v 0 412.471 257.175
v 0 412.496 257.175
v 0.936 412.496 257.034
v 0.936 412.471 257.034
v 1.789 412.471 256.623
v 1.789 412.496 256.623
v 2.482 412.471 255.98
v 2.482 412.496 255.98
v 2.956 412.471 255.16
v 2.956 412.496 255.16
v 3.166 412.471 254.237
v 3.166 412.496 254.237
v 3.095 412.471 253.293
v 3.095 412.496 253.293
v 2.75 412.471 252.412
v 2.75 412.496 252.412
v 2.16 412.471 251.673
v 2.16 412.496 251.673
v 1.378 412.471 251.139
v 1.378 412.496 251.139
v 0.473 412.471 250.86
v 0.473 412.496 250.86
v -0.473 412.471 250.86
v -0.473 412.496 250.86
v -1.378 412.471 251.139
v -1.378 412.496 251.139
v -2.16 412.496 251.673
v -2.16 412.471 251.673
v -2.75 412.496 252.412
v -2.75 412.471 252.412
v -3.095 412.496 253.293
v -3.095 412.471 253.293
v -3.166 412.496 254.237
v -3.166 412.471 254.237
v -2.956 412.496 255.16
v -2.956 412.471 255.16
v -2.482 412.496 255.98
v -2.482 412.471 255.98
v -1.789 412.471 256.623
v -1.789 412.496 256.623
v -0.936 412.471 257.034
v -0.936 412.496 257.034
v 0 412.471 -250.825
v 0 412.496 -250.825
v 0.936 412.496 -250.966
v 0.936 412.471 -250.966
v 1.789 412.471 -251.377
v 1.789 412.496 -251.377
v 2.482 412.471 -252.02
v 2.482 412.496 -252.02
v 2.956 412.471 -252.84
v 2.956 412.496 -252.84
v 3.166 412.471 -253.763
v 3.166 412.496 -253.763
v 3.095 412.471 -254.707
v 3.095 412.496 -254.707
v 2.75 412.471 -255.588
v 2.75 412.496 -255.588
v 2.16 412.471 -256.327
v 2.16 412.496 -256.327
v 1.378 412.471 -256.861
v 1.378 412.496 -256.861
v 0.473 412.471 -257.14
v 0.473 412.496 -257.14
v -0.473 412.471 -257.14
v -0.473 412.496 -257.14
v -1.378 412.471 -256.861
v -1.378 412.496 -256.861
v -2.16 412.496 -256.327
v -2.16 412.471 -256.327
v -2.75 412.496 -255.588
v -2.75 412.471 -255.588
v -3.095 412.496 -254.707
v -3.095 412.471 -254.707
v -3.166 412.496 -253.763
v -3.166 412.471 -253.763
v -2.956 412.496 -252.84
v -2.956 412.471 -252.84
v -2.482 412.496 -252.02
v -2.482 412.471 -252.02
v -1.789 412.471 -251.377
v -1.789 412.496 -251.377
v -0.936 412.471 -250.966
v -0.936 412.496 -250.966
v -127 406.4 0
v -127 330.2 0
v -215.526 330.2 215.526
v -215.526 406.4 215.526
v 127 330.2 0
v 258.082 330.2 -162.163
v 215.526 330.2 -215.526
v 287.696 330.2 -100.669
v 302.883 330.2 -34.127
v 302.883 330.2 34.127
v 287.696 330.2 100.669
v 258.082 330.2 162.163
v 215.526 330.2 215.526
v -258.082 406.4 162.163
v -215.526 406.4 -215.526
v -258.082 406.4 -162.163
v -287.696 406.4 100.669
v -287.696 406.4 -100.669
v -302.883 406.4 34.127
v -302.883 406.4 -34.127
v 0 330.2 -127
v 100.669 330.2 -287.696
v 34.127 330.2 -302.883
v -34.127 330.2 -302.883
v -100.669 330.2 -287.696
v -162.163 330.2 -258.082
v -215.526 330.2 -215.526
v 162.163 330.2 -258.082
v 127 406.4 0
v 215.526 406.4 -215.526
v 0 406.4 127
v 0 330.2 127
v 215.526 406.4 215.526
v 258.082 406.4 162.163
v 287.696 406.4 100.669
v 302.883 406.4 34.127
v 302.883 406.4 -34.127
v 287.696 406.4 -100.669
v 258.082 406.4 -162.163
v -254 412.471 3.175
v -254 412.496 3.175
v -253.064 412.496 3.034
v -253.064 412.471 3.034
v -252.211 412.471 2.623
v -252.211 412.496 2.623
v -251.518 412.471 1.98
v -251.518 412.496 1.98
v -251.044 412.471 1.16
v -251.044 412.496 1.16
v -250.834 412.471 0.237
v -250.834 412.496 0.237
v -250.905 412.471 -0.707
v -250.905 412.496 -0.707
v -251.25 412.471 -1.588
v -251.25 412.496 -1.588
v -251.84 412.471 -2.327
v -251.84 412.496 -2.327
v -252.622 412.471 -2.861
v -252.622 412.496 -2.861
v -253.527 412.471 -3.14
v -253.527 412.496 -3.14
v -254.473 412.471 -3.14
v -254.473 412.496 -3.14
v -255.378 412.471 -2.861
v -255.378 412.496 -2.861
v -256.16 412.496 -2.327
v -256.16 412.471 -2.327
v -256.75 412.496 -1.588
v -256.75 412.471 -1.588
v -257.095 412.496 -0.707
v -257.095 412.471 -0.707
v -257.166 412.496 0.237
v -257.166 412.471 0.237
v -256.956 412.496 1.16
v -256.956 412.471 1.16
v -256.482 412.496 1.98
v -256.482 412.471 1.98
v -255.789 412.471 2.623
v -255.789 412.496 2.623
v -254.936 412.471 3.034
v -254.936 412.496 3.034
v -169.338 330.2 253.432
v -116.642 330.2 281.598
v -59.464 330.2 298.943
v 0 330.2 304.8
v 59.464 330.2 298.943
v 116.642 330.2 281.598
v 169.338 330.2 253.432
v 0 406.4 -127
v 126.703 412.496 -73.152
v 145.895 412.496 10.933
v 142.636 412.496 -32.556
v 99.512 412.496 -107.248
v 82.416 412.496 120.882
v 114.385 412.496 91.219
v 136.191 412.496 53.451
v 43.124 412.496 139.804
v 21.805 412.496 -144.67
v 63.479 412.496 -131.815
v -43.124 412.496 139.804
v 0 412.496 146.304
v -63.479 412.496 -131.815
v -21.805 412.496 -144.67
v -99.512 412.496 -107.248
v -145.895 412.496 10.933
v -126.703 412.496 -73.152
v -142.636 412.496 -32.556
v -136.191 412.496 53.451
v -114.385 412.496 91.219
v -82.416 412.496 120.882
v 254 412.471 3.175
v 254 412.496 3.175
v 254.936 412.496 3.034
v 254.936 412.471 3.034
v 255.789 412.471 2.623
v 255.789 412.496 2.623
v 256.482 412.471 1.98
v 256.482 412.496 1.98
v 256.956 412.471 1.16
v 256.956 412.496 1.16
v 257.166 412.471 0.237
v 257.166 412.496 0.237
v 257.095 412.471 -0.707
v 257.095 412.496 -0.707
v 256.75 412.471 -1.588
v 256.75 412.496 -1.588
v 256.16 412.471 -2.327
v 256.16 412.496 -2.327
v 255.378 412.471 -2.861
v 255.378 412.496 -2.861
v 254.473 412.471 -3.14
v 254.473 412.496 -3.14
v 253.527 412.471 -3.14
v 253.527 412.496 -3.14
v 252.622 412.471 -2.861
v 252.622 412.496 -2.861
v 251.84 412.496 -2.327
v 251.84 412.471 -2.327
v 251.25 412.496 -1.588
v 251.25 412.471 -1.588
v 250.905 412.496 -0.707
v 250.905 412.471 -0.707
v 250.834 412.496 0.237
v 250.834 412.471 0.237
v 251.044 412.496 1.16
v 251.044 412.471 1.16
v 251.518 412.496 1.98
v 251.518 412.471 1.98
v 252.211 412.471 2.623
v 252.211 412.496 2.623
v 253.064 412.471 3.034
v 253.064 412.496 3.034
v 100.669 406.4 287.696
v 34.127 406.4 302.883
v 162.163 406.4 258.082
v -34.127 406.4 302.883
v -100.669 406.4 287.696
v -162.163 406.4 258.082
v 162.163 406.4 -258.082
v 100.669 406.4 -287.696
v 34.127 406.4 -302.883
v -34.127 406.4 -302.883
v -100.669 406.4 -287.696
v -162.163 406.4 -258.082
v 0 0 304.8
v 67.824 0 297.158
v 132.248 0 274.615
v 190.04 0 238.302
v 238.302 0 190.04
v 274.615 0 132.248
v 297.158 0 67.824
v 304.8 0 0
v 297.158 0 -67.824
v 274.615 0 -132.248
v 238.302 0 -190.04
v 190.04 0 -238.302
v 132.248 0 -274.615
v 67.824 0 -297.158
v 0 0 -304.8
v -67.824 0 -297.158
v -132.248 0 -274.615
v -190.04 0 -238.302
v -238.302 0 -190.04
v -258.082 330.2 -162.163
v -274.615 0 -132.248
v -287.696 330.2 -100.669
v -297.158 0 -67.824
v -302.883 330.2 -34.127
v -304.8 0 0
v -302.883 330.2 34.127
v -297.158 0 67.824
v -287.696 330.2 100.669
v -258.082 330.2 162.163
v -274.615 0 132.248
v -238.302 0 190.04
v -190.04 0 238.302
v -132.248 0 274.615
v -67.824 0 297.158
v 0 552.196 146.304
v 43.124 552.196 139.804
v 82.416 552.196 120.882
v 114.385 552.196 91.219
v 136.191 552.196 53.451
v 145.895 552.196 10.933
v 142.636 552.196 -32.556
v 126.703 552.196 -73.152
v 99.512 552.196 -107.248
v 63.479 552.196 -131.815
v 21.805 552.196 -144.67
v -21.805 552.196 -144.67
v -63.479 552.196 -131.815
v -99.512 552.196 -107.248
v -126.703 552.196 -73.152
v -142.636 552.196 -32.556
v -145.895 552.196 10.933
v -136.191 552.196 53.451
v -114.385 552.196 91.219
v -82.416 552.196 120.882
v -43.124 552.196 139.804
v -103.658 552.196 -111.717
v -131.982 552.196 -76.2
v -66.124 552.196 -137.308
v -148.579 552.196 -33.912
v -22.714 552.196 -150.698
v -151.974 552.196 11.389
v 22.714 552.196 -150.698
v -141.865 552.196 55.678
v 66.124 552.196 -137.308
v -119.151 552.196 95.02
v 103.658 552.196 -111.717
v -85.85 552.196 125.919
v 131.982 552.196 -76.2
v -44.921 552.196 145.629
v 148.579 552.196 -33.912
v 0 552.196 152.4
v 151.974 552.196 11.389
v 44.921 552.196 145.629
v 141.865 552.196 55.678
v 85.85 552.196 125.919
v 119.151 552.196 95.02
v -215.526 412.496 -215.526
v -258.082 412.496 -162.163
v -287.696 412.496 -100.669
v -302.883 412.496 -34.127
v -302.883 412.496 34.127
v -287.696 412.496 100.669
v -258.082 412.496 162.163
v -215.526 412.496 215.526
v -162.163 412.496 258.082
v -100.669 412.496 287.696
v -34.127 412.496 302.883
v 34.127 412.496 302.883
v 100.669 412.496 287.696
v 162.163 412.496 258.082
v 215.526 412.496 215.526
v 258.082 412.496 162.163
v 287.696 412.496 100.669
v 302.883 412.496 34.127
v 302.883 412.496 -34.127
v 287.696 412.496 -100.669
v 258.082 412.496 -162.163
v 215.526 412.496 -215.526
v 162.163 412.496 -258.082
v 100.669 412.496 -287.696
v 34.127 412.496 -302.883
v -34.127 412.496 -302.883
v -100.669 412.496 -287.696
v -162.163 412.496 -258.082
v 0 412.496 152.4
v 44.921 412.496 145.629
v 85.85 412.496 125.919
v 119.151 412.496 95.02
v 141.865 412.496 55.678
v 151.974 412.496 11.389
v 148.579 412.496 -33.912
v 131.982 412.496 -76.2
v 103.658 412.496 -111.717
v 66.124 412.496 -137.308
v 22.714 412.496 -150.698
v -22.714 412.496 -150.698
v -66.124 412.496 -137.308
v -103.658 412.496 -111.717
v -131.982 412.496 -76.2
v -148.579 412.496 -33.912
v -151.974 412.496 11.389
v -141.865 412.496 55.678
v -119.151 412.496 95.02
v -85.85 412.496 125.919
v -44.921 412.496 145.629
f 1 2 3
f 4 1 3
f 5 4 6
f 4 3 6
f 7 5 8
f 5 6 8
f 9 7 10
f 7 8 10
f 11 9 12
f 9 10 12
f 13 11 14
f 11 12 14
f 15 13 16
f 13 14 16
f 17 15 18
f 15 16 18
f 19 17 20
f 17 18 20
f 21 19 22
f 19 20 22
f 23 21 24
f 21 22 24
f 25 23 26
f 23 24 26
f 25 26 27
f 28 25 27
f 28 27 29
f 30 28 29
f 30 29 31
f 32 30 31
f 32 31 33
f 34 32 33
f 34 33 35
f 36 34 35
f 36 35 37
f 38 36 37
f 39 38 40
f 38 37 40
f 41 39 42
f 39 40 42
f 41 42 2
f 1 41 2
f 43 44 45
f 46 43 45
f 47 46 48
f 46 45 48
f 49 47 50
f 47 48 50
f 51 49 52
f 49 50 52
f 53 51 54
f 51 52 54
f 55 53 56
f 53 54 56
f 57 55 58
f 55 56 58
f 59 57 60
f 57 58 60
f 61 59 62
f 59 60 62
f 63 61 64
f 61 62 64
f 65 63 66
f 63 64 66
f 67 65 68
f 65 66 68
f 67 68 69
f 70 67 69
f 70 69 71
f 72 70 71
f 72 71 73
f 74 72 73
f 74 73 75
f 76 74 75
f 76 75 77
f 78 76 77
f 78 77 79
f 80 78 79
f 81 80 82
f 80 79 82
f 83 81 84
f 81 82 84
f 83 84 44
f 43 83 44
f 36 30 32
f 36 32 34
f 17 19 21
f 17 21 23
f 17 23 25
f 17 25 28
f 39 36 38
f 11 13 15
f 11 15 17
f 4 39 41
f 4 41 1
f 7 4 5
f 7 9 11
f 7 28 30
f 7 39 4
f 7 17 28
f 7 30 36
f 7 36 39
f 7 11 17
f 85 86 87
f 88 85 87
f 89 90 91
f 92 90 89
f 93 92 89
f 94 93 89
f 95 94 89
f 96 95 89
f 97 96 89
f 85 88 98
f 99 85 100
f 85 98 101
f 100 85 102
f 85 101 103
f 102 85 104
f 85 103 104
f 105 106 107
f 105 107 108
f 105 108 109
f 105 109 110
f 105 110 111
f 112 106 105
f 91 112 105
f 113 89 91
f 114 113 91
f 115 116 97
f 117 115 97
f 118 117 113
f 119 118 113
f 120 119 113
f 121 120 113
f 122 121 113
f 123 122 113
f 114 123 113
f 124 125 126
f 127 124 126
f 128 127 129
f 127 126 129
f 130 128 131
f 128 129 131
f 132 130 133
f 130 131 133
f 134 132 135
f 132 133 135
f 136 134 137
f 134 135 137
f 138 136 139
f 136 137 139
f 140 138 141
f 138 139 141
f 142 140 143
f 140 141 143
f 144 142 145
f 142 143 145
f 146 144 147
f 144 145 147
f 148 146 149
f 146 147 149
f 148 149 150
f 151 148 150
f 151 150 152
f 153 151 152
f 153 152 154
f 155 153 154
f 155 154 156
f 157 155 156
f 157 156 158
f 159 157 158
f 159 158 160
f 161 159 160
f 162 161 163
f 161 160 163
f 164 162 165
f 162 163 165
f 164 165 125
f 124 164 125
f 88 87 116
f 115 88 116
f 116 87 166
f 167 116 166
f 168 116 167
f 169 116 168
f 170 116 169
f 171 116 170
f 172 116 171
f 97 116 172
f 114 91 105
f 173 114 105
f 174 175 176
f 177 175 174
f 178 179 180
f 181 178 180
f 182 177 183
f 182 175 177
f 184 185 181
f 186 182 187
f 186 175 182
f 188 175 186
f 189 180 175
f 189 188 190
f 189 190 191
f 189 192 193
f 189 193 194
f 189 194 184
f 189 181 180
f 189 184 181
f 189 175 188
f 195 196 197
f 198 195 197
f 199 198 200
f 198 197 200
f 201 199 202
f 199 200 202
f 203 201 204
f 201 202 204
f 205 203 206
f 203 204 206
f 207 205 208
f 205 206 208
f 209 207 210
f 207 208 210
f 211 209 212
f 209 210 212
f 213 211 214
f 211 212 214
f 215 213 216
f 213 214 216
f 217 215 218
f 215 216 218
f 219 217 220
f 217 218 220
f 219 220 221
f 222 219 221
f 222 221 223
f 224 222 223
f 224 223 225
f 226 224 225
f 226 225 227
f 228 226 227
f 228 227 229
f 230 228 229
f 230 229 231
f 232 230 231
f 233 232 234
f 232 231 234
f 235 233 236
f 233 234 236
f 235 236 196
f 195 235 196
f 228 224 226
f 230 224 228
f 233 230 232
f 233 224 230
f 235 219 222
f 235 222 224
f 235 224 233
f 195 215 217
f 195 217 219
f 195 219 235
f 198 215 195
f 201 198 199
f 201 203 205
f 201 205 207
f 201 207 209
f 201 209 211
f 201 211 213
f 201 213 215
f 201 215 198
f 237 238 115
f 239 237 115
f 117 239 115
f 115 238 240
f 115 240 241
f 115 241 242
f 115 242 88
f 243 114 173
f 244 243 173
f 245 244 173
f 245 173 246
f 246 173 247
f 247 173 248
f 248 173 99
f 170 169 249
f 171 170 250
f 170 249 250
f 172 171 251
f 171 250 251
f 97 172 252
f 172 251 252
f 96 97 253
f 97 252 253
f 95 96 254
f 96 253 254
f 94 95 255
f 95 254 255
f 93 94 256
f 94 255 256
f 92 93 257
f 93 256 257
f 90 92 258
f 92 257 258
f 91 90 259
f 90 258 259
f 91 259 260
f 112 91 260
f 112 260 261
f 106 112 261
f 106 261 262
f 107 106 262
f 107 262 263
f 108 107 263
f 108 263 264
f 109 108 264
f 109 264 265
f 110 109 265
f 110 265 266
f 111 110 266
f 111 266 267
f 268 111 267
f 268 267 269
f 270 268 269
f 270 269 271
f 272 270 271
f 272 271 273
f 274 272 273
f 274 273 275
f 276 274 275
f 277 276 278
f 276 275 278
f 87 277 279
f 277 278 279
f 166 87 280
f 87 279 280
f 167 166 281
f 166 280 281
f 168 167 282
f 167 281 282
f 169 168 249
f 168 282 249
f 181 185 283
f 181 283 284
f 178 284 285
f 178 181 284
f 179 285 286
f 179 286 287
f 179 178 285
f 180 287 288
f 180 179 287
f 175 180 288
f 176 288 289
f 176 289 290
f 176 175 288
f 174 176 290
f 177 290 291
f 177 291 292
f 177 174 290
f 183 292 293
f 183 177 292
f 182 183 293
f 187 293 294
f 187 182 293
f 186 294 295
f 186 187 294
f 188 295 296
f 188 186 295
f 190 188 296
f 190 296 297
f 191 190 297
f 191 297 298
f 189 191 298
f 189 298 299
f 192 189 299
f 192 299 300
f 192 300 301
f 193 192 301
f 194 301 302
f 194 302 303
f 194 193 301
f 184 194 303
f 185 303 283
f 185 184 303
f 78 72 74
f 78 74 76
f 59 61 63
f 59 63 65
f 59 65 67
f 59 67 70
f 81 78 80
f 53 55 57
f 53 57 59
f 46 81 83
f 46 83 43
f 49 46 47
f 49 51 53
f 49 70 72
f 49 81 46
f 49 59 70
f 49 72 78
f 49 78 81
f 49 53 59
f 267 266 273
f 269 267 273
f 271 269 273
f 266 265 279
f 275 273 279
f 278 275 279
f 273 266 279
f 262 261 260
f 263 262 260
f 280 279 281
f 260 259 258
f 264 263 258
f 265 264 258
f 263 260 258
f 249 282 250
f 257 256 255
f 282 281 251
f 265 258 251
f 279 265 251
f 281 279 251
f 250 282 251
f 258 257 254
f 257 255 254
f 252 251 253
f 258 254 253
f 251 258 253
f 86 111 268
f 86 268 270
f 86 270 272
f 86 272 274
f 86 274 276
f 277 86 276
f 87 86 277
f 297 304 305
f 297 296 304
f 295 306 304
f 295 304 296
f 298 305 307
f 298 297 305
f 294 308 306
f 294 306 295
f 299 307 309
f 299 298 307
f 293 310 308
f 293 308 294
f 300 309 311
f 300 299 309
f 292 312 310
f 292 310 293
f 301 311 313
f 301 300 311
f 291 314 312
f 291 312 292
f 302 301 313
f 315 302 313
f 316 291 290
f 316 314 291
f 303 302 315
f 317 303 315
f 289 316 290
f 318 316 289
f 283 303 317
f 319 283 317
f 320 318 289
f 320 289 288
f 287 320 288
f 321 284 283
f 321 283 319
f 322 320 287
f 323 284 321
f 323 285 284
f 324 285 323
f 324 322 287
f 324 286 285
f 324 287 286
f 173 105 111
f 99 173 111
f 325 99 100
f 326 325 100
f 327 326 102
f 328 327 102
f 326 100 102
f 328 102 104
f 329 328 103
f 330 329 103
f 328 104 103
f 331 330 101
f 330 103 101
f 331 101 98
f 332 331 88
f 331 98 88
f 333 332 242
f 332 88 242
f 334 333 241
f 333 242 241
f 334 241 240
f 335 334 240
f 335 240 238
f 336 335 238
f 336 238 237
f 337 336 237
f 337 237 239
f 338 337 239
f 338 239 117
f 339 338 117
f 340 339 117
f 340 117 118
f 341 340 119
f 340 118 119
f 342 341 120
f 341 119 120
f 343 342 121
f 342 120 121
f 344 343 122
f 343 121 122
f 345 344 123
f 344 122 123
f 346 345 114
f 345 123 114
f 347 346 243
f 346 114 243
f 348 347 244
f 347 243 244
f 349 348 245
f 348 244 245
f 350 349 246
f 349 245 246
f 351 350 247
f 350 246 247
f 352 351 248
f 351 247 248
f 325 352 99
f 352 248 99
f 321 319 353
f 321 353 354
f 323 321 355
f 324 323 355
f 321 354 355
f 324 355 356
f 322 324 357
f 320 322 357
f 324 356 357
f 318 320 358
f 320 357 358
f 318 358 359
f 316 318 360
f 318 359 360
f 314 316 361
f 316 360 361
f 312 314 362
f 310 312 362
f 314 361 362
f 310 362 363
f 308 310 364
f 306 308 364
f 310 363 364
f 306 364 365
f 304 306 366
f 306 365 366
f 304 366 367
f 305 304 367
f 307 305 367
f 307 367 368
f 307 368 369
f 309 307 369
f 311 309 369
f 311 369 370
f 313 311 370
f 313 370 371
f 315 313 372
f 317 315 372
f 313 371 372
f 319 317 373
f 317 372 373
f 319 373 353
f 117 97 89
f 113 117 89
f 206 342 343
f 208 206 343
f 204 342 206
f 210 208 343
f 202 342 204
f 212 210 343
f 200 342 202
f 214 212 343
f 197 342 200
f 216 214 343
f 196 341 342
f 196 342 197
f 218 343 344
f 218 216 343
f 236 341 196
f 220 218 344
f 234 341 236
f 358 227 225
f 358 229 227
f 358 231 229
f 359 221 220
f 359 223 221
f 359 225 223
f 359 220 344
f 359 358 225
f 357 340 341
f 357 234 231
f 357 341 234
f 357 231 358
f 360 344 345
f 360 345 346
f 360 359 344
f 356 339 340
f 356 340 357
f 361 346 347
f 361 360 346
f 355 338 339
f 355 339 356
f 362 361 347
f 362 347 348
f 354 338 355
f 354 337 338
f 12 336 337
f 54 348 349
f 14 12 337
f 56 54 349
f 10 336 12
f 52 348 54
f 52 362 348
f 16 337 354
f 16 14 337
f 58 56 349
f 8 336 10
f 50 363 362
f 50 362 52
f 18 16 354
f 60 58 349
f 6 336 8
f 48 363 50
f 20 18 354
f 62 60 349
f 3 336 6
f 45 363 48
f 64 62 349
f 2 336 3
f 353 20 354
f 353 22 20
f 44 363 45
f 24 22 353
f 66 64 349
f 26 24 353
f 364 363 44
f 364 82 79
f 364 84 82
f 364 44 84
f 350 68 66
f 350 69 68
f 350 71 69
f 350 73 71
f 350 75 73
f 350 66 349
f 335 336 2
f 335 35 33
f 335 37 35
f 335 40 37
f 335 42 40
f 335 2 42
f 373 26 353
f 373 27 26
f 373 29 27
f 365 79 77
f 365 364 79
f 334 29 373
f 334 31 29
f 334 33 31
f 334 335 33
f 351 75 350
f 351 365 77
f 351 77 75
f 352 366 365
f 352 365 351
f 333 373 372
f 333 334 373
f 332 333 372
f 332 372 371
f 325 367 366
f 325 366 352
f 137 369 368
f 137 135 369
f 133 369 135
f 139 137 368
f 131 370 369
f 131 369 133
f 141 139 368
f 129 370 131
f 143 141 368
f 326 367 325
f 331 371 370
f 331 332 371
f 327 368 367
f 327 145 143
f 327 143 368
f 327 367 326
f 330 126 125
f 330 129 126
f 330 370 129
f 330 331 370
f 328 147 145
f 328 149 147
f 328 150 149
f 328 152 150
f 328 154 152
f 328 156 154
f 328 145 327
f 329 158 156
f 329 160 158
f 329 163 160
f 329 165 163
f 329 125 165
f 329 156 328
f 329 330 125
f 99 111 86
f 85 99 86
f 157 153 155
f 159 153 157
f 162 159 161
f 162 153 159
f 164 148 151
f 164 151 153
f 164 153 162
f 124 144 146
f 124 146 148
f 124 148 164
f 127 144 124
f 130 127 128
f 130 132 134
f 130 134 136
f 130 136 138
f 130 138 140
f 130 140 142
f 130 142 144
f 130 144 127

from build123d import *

# Parameters (mm, degrees)
SKETCH11_R          = 304.8
BOSS_EXTRUDE5_DEPTH = 330.2
BOSS_EXTRUDE6_DEPTH = 76.2
SKETCH13_R          = 304.8
BOSS_EXTRUDE7_DEPTH = 6.096
SKETCH14_R          = 152.4
SKETCH14_R_2        = 146.304
BOSS_EXTRUDE8_DEPTH = 139.7
SKETCH16_R          = 3.175
CUT_EXTRUDE2_DEPTH  = 0.0254


with BuildPart() as part:
    # Sketch11 → Boss-Extrude5 (new body)
    with BuildSketch(Plane(origin=(0, 0, 0), x_dir=(1, 0, 0), z_dir=(0, 1, 0))):
        with Locations(Location((0, 0, 0), (0, 0, 270))):
            Circle(SKETCH11_R)
    extrude(amount=BOSS_EXTRUDE5_DEPTH)

    # Sketch12 → Boss-Extrude6 (add)
    with BuildSketch(Plane(origin=(0, 330.2, 0), x_dir=(1, 0, 0), z_dir=(0, 1, 0))):
        Polygon((-127, 0), (-215.526146906, -215.526146906), (0, -127), (215.526146906, -215.526146906), (127, 0), (215.526146906, 215.526146906), (0, 127), (-215.526146906, 215.526146906), align=None)
    extrude(amount=BOSS_EXTRUDE6_DEPTH)

    # Sketch13 → Boss-Extrude7 (add)
    with BuildSketch(Plane(origin=(0, 406.4, 0), x_dir=(1, 0, 0), z_dir=(0, 1, 0))):
        with Locations(Location((0, 0, 0), (0, 0, 135))):
            Circle(SKETCH13_R)
    extrude(amount=BOSS_EXTRUDE7_DEPTH)

    # Sketch14 → Boss-Extrude8 (add)
    with BuildSketch(Plane(origin=(0, 412.496, 0), x_dir=(1, 0, 0), z_dir=(0, 1, 0))):
        with Locations(Location((0, 0, 0), (0, 0, 270))):
            Circle(SKETCH14_R)
        with Locations(Location((0, 0, 0), (0, 0, 270))):
            Circle(SKETCH14_R_2, mode=Mode.SUBTRACT)
    extrude(amount=BOSS_EXTRUDE8_DEPTH)

    # Sketch16 → Cut-Extrude2 (cut)
    with BuildSketch(Plane(origin=(0, 412.496, 0), x_dir=(1, 0, 0), z_dir=(0, 1, 0))):
        with Locations(Location((254, 0, 0), (0, 0, 270))):
            Circle(SKETCH16_R)
        with Locations(Location((0, 254, 0), (0, 0, 270))):
            Circle(SKETCH16_R)
        with Locations(Location((0, -254, 0), (0, 0, 270))):
            Circle(SKETCH16_R)
        with Locations(Location((-254, 0, 0), (0, 0, 270))):
            Circle(SKETCH16_R)
    extrude(amount=-CUT_EXTRUDE2_DEPTH, mode=Mode.SUBTRACT)


solid = part.part
